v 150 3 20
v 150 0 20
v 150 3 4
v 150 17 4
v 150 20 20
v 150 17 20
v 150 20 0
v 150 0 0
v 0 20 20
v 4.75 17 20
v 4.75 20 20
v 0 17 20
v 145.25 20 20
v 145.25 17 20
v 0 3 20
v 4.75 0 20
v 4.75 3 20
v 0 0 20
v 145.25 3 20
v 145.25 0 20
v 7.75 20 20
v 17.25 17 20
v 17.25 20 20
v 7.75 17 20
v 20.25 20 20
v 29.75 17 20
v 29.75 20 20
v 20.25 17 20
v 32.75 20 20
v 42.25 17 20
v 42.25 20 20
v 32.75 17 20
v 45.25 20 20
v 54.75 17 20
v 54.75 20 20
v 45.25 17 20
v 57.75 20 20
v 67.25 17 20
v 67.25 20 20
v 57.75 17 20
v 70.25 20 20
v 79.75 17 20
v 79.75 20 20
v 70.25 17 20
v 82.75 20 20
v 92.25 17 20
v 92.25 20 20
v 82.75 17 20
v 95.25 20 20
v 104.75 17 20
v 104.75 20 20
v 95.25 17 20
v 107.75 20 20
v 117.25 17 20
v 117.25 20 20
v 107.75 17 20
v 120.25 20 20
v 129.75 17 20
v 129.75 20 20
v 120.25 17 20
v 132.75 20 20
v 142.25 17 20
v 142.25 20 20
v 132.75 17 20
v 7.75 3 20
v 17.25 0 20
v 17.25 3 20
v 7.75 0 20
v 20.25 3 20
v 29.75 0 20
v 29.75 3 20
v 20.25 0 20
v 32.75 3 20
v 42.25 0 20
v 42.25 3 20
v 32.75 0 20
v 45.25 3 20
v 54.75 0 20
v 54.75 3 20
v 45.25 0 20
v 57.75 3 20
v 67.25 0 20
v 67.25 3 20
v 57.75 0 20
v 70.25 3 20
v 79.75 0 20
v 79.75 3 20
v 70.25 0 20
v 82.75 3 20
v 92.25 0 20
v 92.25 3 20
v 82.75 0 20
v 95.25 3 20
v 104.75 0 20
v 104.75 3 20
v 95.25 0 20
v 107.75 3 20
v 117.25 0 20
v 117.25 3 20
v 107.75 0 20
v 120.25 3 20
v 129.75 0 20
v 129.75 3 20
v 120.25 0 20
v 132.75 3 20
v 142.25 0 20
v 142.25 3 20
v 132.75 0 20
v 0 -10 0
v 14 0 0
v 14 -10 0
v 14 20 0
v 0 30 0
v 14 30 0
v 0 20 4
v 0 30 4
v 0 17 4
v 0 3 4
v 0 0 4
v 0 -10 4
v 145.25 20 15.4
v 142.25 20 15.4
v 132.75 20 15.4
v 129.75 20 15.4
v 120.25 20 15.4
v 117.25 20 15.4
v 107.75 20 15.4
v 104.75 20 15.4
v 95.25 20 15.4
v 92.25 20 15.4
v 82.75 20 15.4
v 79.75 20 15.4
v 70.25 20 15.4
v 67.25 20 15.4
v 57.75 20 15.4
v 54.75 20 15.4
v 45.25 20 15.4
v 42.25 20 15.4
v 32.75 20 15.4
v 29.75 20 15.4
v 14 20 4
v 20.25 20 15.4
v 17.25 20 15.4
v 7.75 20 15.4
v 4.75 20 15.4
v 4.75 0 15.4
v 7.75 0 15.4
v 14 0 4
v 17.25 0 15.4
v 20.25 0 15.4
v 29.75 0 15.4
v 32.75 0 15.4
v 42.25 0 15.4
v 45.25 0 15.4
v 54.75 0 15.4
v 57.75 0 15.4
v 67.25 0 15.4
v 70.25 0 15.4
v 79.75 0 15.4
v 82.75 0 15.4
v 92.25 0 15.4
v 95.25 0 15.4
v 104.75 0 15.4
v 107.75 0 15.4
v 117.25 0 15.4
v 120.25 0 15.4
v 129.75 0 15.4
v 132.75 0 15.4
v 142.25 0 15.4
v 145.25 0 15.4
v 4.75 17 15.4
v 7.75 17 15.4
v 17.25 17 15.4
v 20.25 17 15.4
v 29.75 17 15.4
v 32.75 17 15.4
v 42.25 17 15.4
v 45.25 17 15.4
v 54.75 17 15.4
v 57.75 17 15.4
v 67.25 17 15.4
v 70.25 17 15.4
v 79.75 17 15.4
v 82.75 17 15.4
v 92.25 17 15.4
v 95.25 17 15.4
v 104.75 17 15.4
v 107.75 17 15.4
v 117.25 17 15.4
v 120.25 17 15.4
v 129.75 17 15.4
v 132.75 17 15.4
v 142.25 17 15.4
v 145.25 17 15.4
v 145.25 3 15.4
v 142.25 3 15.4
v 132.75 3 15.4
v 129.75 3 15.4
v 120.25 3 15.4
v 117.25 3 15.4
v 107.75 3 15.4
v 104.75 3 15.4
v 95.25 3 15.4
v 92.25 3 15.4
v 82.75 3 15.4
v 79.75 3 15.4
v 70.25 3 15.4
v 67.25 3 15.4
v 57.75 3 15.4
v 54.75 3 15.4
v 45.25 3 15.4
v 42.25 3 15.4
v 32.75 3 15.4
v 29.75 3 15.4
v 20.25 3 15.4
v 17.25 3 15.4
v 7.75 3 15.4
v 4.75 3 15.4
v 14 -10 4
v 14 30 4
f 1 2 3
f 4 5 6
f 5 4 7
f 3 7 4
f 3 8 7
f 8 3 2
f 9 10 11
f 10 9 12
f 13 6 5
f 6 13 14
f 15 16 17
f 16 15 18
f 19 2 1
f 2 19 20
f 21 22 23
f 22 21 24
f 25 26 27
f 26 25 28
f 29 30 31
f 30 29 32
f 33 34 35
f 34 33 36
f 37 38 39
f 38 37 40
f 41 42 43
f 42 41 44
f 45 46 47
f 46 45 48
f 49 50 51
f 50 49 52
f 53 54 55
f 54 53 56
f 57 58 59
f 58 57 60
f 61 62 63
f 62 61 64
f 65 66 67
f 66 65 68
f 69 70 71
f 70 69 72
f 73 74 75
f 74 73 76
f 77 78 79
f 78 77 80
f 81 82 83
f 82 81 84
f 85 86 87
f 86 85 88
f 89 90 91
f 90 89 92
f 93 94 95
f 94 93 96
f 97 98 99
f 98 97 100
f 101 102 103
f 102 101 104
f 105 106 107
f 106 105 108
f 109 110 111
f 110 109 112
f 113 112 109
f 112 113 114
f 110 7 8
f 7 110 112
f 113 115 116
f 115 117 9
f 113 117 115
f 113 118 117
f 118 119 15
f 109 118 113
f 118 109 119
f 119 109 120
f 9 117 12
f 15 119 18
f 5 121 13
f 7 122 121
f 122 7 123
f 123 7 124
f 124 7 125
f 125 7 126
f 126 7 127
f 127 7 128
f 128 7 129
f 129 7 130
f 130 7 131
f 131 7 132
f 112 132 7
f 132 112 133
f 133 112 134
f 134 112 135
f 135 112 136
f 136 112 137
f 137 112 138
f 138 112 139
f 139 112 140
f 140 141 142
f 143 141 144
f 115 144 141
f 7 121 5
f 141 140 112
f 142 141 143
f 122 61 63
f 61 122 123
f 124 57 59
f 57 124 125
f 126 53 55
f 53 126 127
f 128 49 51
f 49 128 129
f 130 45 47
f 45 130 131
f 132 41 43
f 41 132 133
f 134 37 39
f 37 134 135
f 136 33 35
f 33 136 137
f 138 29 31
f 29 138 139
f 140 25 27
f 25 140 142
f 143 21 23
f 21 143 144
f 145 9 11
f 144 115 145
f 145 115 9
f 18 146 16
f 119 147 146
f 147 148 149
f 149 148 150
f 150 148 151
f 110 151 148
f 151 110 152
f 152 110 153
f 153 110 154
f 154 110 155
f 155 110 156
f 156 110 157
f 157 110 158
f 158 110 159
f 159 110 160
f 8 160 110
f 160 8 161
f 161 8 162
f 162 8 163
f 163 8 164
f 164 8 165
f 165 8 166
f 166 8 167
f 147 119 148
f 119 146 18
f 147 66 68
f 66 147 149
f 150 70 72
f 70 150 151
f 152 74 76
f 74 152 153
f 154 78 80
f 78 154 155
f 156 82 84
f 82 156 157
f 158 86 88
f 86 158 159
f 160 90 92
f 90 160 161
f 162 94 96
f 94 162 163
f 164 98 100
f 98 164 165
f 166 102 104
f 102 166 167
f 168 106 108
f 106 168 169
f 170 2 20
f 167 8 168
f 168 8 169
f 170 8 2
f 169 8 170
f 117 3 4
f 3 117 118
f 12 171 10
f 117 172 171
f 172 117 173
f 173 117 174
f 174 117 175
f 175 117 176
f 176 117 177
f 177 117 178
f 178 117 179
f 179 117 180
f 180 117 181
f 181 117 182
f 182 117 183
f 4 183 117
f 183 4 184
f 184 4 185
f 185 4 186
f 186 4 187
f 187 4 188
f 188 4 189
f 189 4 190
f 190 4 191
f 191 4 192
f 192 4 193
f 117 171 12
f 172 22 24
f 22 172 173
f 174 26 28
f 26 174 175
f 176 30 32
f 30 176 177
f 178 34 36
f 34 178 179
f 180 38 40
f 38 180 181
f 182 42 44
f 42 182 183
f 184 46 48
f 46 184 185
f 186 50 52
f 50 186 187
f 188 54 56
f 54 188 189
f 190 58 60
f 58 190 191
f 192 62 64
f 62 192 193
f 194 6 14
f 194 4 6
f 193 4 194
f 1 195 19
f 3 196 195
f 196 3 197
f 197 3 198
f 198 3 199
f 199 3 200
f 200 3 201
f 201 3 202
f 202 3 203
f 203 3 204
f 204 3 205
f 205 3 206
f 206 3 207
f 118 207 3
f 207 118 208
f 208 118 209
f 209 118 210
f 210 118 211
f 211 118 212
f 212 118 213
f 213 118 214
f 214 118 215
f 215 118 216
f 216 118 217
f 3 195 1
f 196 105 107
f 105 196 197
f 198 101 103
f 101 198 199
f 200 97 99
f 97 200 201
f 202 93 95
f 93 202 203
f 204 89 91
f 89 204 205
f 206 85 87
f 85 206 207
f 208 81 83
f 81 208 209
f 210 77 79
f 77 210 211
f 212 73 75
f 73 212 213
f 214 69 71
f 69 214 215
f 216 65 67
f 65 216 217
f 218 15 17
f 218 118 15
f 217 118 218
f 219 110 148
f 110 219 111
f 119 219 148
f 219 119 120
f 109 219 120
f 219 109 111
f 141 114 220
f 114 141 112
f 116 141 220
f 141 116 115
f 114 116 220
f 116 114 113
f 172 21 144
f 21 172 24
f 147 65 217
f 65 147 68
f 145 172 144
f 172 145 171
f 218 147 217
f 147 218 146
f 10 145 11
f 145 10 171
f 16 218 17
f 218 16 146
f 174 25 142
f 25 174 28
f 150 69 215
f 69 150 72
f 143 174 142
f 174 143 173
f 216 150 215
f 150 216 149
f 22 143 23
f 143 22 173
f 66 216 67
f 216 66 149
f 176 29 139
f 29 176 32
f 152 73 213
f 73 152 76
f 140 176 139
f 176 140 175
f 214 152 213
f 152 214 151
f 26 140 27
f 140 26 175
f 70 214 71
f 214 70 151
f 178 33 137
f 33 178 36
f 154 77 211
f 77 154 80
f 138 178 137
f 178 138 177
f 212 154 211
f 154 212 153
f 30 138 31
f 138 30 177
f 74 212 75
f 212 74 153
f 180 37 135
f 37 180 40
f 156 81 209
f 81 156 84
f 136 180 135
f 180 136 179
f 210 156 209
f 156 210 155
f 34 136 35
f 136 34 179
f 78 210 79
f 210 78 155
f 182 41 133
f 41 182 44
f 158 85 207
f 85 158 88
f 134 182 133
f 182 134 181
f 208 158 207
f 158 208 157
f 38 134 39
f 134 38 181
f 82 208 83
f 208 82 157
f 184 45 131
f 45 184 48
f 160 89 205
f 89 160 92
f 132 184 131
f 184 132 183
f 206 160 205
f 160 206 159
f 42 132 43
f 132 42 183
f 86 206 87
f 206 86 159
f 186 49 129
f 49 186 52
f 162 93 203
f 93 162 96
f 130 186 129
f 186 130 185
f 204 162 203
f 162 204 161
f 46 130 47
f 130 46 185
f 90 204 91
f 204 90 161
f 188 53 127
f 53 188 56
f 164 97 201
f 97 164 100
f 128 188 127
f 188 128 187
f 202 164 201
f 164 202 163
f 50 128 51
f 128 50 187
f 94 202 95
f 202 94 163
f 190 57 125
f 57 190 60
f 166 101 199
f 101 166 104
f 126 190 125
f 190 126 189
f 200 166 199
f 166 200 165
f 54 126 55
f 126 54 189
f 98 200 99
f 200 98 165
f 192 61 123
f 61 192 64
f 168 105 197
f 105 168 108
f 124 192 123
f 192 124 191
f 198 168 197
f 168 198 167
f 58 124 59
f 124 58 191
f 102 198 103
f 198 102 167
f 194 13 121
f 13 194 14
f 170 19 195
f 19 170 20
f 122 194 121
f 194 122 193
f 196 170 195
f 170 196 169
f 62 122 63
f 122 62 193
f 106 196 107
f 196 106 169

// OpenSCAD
$fn = 32;

// ----------------------------------------------------------------------
// Cable duct: 150 x 20 x 20 mm, 12 fingers
// ----------------------------------------------------------------------

// --- parameters (mm) ---
channel_l = 150;          // duct length, X
channel_w = 20;           // duct width, Y
channel_h = 20;           // duct height, Z
channel_t = 3;            // side wall thickness
floor_t = 4;              // floor thickness
slot_w = 3;               // finger slot width
slot_h = 11.4;            // finger slot height
fingers = 12;             // number of finger slots per side
pitch = 12.5;             // finger pitch
ear_w = 11;               // mounting ear width
ear_l = 14;               // mounting ear length

module shell() {
  difference() {
    cube([channel_l, channel_w, channel_h]);
    /* open top channel */
    translate([-channel_t - 1, channel_t, floor_t])
      cube([channel_l + 2 * channel_t + 2, channel_w - 2 * channel_t, channel_h + 1]);
  }
}

module ears() {
  translate([0, -ear_w + 1, 0]) cube([ear_l, ear_w, floor_t]);
  translate([0, channel_w - 1, 0]) cube([ear_l, ear_w, floor_t]);
}

difference() {
  union() {
    shell();
    ears();
  }
  /* finger slots cut through both side walls */
  for (i = [0 : fingers - 1]) translate([pitch / 2 + i * pitch - slot_w / 2, -1, floor_t + slot_h]) cube([slot_w, channel_w + 2, channel_h]);
}
